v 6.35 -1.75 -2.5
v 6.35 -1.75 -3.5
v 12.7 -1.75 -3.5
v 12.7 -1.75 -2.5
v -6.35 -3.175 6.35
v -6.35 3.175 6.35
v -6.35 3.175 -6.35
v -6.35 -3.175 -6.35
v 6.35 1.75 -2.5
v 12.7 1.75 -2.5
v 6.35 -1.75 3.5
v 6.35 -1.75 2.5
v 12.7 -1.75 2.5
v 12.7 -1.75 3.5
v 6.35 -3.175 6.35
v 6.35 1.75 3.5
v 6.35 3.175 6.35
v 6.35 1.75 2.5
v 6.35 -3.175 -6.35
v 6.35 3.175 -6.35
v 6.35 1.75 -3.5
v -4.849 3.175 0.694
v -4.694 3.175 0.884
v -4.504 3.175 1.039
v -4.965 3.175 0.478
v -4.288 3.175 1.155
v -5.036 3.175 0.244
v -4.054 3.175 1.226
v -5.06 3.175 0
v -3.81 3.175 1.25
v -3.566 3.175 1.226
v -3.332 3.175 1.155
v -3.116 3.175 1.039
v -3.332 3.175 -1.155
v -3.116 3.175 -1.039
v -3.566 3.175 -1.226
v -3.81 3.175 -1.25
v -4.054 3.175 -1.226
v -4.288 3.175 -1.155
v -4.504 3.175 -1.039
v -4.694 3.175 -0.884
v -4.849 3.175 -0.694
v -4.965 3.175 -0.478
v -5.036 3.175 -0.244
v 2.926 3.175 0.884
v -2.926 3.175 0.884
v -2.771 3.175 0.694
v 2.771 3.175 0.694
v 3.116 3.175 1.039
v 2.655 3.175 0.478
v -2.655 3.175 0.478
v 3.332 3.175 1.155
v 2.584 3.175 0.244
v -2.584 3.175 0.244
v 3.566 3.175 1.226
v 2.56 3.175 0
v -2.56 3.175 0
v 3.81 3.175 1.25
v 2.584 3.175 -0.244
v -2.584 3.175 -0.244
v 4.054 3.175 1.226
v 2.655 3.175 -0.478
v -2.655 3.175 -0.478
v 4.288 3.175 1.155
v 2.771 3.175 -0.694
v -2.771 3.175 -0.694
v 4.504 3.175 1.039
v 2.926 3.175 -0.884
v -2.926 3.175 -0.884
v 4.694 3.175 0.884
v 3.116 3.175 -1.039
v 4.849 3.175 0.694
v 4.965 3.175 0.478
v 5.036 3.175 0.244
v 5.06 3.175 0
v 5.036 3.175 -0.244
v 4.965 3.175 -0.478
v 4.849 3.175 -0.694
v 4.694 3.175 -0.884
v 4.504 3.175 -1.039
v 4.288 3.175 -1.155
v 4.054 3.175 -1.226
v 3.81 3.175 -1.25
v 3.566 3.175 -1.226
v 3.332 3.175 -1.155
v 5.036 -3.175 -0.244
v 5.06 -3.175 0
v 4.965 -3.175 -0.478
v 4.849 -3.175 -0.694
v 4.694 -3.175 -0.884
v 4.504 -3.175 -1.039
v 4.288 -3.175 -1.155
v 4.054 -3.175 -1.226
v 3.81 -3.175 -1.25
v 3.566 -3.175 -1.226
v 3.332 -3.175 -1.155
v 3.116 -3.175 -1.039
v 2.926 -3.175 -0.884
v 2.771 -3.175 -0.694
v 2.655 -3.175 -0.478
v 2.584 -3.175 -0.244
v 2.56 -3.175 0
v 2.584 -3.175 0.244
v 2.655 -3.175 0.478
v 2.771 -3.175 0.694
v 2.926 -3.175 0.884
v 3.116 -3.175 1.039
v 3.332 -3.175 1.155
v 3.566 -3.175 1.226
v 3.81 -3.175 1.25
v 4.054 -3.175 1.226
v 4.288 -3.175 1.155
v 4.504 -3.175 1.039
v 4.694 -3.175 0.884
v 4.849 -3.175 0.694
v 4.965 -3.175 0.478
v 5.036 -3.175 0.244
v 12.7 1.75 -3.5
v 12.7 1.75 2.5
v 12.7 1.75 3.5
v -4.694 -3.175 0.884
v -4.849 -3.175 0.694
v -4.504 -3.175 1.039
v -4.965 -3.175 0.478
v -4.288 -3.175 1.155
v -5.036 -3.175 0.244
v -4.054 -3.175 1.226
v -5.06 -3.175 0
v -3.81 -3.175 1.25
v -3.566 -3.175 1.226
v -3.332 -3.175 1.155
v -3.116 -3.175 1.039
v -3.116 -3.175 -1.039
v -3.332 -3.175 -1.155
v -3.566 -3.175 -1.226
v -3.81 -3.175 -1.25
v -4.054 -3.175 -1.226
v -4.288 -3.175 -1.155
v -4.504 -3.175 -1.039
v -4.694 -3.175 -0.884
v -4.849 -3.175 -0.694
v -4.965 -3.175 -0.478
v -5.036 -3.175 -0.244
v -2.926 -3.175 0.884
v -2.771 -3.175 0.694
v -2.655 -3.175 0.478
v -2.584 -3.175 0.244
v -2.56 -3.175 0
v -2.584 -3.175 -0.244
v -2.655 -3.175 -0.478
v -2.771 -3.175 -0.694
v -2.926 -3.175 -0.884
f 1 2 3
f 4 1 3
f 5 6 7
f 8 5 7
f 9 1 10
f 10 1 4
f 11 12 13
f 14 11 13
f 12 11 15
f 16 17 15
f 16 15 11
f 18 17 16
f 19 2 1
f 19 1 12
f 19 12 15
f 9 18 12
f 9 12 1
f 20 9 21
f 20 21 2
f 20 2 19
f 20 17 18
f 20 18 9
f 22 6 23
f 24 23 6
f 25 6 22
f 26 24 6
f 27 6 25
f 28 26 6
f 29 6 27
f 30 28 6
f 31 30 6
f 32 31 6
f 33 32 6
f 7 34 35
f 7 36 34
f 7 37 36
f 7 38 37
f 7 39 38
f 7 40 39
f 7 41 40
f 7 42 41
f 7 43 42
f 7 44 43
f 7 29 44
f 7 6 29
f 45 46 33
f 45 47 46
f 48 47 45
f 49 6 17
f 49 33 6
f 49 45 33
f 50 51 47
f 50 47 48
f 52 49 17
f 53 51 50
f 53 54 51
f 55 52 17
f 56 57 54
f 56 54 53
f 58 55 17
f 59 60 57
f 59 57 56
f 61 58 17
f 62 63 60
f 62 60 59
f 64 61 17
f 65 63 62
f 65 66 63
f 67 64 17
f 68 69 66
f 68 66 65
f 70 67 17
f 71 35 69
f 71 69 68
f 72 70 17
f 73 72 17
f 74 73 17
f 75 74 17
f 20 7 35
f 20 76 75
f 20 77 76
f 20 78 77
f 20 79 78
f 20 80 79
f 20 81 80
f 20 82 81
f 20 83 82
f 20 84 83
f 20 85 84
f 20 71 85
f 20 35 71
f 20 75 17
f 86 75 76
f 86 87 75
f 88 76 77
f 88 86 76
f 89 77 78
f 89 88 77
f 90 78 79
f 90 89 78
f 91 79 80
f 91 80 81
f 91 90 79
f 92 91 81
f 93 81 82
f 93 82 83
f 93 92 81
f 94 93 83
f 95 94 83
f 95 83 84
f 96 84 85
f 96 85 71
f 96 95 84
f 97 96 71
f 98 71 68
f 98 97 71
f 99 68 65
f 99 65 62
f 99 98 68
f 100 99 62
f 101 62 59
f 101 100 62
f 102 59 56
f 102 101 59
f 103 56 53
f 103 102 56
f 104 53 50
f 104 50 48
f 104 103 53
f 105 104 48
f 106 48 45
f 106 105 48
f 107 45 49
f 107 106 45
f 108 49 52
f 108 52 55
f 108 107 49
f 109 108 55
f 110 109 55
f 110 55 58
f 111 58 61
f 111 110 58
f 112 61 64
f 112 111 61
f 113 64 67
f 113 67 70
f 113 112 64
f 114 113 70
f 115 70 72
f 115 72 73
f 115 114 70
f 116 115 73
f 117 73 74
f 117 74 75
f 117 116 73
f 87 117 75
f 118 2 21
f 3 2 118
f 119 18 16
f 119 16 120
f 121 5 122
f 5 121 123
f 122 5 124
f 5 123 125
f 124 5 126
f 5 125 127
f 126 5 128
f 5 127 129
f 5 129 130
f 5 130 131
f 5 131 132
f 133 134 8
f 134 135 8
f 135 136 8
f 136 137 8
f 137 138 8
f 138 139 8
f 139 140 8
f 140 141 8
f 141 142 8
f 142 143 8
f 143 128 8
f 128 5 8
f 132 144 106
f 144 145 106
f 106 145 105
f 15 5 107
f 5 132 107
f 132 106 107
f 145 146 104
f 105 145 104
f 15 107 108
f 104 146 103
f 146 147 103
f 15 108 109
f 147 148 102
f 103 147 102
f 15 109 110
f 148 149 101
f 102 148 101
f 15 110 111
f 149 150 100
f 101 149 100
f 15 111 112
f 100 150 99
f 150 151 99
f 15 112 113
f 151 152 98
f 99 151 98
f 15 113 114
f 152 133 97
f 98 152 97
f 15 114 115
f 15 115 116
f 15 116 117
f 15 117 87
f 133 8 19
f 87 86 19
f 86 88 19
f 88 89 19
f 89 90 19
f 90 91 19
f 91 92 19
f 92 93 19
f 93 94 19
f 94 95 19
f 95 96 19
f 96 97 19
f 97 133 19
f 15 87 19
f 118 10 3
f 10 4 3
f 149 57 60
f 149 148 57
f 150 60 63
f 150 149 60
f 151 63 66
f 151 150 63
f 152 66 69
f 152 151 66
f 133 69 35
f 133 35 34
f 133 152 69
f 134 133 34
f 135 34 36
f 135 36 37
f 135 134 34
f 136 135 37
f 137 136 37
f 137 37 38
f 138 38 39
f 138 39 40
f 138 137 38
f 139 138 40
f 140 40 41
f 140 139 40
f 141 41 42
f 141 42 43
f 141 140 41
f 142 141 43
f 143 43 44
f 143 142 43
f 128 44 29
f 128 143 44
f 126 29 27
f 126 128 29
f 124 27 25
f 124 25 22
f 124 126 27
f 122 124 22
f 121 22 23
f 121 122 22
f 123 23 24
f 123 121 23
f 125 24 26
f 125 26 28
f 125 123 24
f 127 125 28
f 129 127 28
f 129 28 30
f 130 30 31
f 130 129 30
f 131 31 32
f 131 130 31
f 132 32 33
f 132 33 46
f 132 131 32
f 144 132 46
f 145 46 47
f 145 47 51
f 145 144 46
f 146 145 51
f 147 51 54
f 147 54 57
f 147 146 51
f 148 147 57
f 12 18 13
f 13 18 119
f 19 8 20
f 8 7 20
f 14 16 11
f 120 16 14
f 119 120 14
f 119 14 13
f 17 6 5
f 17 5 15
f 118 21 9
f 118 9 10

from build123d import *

# Parameters (mm, degrees)
SKETCH1_W           = 12.7
SKETCH1_H           = 12.7
SKETCH1_R           = 1.25
BOSS_EXTRUDE1_DEPTH = 3.175
SKETCH2_W           = 6.35
SKETCH2_H           = 1
BOSS_EXTRUDE2_DEPTH = 1.75


with BuildPart() as part:
    # Sketch1 → Boss-Extrude1 (new body, symmetric)
    with BuildSketch(Plane(origin=(0, 0, 0), x_dir=(1, 0, 0), z_dir=(0, 1, 0))):
        Rectangle(SKETCH1_W, SKETCH1_H)
        with Locations((-3.81, 0)):
            Circle(SKETCH1_R, mode=Mode.SUBTRACT)
        with Locations((3.81, 0)):
            Circle(SKETCH1_R, mode=Mode.SUBTRACT)
    extrude(amount=BOSS_EXTRUDE1_DEPTH, both=True)

    # Sketch2 → Boss-Extrude2 (add, symmetric)
    with BuildSketch(Plane(origin=(0, 0, 0), x_dir=(1, 0, 0), z_dir=(0, 1, 0))):
        with Locations((9.525, 3)):
            Rectangle(SKETCH2_W, SKETCH2_H)
        with Locations((9.525, -3)):
            Rectangle(SKETCH2_W, SKETCH2_H)
    extrude(amount=BOSS_EXTRUDE2_DEPTH, both=True)


solid = part.part
